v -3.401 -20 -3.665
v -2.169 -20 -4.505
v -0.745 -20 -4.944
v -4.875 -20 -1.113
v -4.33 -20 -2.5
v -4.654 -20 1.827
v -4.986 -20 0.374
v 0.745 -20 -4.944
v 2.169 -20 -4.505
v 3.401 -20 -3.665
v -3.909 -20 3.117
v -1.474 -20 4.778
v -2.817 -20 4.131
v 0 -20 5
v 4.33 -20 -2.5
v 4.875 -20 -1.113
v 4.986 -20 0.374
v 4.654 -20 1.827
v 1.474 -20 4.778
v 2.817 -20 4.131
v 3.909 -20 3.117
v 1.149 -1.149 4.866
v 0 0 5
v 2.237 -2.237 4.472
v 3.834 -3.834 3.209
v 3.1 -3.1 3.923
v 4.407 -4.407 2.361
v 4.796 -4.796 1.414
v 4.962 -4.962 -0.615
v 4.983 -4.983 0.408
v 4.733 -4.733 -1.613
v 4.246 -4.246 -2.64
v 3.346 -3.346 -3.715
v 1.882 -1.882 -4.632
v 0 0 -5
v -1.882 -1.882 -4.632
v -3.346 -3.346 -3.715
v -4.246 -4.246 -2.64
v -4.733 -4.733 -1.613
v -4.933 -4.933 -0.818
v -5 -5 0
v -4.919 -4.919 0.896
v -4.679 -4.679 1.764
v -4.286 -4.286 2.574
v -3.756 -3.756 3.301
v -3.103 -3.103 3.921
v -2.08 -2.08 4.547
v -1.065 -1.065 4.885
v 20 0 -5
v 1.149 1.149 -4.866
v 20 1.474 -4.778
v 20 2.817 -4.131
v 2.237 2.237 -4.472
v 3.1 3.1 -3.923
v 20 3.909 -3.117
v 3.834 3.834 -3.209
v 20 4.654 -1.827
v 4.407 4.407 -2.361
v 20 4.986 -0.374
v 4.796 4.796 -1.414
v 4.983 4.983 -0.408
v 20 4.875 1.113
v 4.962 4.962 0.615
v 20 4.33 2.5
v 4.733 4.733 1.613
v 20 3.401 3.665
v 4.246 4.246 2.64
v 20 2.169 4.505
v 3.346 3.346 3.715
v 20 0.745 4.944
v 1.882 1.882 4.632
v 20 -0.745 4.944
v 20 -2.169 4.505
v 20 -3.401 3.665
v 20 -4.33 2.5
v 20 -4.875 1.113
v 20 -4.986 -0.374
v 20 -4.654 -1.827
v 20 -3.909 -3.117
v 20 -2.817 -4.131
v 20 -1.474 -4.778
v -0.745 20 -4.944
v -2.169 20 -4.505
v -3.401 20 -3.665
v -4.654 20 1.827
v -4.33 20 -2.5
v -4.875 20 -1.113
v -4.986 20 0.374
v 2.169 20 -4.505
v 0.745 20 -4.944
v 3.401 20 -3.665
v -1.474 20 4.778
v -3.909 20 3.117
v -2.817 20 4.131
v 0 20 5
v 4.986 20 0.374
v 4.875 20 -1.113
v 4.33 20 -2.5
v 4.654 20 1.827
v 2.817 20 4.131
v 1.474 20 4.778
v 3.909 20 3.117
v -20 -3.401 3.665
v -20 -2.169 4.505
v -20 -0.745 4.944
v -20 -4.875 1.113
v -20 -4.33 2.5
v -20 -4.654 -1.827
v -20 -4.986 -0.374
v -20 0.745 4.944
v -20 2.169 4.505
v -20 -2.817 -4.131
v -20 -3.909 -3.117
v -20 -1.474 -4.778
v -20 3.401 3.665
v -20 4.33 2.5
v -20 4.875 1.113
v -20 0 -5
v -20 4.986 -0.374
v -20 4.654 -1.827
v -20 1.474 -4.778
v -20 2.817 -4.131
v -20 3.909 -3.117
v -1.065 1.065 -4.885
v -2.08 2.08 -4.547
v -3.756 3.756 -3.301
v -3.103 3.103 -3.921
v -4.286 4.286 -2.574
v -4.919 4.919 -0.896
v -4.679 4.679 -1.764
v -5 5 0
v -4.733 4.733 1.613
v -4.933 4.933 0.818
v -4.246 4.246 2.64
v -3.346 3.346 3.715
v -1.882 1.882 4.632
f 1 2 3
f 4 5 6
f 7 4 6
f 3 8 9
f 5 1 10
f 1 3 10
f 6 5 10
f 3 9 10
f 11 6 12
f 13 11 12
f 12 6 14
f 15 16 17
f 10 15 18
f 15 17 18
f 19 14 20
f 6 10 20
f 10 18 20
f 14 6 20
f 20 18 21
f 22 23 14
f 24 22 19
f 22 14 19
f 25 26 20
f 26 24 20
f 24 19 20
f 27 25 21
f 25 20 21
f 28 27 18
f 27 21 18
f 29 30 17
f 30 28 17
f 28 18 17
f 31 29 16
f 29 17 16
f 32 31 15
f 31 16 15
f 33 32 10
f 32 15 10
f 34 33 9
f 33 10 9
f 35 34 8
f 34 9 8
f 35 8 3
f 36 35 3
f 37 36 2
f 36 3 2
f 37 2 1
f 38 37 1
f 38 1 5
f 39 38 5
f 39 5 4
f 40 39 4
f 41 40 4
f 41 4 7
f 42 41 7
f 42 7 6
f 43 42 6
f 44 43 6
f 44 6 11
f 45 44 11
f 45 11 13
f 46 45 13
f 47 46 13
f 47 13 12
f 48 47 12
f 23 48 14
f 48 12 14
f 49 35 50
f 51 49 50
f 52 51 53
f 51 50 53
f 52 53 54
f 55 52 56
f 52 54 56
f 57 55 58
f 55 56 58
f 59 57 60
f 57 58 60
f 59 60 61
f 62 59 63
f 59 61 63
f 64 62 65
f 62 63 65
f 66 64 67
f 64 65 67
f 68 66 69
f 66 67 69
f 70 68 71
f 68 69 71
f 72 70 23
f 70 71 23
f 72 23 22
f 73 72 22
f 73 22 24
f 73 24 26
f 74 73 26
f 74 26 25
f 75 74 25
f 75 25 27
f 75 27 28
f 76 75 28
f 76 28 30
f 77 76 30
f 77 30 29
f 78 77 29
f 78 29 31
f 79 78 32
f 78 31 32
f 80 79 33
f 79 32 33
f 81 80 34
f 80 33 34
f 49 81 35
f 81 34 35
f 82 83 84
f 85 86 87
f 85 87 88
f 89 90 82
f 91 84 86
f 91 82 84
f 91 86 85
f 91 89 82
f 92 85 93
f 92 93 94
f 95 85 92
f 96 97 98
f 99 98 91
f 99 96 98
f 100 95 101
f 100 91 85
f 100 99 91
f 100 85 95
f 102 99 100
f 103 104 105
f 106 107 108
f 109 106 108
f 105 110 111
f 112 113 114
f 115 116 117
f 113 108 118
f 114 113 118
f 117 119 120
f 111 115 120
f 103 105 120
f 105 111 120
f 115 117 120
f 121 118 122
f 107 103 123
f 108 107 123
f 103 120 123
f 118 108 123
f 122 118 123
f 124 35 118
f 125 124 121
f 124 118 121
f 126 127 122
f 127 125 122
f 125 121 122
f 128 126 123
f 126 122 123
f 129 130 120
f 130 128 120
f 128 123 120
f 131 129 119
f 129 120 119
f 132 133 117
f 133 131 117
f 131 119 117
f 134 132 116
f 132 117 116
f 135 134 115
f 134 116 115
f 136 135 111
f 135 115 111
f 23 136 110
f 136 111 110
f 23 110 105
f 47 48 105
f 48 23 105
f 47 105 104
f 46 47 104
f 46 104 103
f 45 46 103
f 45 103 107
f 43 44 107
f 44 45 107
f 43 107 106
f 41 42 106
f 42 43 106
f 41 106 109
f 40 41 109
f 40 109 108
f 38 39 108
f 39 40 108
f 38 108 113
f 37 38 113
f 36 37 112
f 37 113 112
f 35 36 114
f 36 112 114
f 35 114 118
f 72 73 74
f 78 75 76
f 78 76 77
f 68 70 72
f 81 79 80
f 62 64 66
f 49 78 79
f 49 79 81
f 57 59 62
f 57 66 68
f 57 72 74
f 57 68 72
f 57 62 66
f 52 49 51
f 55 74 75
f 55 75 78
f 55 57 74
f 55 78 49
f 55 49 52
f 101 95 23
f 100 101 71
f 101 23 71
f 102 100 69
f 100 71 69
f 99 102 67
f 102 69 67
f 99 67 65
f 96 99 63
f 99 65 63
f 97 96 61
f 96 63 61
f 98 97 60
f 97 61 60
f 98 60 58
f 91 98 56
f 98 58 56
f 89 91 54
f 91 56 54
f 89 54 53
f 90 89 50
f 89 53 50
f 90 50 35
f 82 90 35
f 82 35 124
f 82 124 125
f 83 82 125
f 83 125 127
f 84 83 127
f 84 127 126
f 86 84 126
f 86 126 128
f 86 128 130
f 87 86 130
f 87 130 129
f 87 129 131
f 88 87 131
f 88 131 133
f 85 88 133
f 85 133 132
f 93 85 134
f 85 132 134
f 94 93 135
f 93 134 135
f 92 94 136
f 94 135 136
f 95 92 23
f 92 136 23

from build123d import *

# Parameters (mm, degrees)
BOSS_EXTRUDE1_DEPTH      = 20
BOSS_EXTRUDE1_DEPTH_BACK = 20
SKETCH1_R                = 5
BOSS_EXTRUDE2_DEPTH      = 20
BOSS_EXTRUDE2_DEPTH_BACK = 20
SKETCH2_R                = 5


with BuildPart() as part:
    # Sketch1 → Boss-Extrude1 (new, two sides: drawn at the far end of the back side and taken through both)
    with BuildSketch(Plane(origin=(0, 0, 0), x_dir=(0, 0, -1), z_dir=(1, 0, 0)).offset(-BOSS_EXTRUDE1_DEPTH_BACK)):
        Circle(SKETCH1_R)
    extrude(amount=BOSS_EXTRUDE1_DEPTH + BOSS_EXTRUDE1_DEPTH_BACK)

    # Sketch2 → Boss-Extrude2 (add, two sides: drawn at the far end of the back side and taken through both)
    with BuildSketch(Plane(origin=(0, 0, 0), x_dir=(1, 0, 0), z_dir=(0, 1, 0)).offset(-BOSS_EXTRUDE2_DEPTH_BACK)):
        Circle(SKETCH2_R)
    extrude(amount=BOSS_EXTRUDE2_DEPTH + BOSS_EXTRUDE2_DEPTH_BACK)


solid = part.part
